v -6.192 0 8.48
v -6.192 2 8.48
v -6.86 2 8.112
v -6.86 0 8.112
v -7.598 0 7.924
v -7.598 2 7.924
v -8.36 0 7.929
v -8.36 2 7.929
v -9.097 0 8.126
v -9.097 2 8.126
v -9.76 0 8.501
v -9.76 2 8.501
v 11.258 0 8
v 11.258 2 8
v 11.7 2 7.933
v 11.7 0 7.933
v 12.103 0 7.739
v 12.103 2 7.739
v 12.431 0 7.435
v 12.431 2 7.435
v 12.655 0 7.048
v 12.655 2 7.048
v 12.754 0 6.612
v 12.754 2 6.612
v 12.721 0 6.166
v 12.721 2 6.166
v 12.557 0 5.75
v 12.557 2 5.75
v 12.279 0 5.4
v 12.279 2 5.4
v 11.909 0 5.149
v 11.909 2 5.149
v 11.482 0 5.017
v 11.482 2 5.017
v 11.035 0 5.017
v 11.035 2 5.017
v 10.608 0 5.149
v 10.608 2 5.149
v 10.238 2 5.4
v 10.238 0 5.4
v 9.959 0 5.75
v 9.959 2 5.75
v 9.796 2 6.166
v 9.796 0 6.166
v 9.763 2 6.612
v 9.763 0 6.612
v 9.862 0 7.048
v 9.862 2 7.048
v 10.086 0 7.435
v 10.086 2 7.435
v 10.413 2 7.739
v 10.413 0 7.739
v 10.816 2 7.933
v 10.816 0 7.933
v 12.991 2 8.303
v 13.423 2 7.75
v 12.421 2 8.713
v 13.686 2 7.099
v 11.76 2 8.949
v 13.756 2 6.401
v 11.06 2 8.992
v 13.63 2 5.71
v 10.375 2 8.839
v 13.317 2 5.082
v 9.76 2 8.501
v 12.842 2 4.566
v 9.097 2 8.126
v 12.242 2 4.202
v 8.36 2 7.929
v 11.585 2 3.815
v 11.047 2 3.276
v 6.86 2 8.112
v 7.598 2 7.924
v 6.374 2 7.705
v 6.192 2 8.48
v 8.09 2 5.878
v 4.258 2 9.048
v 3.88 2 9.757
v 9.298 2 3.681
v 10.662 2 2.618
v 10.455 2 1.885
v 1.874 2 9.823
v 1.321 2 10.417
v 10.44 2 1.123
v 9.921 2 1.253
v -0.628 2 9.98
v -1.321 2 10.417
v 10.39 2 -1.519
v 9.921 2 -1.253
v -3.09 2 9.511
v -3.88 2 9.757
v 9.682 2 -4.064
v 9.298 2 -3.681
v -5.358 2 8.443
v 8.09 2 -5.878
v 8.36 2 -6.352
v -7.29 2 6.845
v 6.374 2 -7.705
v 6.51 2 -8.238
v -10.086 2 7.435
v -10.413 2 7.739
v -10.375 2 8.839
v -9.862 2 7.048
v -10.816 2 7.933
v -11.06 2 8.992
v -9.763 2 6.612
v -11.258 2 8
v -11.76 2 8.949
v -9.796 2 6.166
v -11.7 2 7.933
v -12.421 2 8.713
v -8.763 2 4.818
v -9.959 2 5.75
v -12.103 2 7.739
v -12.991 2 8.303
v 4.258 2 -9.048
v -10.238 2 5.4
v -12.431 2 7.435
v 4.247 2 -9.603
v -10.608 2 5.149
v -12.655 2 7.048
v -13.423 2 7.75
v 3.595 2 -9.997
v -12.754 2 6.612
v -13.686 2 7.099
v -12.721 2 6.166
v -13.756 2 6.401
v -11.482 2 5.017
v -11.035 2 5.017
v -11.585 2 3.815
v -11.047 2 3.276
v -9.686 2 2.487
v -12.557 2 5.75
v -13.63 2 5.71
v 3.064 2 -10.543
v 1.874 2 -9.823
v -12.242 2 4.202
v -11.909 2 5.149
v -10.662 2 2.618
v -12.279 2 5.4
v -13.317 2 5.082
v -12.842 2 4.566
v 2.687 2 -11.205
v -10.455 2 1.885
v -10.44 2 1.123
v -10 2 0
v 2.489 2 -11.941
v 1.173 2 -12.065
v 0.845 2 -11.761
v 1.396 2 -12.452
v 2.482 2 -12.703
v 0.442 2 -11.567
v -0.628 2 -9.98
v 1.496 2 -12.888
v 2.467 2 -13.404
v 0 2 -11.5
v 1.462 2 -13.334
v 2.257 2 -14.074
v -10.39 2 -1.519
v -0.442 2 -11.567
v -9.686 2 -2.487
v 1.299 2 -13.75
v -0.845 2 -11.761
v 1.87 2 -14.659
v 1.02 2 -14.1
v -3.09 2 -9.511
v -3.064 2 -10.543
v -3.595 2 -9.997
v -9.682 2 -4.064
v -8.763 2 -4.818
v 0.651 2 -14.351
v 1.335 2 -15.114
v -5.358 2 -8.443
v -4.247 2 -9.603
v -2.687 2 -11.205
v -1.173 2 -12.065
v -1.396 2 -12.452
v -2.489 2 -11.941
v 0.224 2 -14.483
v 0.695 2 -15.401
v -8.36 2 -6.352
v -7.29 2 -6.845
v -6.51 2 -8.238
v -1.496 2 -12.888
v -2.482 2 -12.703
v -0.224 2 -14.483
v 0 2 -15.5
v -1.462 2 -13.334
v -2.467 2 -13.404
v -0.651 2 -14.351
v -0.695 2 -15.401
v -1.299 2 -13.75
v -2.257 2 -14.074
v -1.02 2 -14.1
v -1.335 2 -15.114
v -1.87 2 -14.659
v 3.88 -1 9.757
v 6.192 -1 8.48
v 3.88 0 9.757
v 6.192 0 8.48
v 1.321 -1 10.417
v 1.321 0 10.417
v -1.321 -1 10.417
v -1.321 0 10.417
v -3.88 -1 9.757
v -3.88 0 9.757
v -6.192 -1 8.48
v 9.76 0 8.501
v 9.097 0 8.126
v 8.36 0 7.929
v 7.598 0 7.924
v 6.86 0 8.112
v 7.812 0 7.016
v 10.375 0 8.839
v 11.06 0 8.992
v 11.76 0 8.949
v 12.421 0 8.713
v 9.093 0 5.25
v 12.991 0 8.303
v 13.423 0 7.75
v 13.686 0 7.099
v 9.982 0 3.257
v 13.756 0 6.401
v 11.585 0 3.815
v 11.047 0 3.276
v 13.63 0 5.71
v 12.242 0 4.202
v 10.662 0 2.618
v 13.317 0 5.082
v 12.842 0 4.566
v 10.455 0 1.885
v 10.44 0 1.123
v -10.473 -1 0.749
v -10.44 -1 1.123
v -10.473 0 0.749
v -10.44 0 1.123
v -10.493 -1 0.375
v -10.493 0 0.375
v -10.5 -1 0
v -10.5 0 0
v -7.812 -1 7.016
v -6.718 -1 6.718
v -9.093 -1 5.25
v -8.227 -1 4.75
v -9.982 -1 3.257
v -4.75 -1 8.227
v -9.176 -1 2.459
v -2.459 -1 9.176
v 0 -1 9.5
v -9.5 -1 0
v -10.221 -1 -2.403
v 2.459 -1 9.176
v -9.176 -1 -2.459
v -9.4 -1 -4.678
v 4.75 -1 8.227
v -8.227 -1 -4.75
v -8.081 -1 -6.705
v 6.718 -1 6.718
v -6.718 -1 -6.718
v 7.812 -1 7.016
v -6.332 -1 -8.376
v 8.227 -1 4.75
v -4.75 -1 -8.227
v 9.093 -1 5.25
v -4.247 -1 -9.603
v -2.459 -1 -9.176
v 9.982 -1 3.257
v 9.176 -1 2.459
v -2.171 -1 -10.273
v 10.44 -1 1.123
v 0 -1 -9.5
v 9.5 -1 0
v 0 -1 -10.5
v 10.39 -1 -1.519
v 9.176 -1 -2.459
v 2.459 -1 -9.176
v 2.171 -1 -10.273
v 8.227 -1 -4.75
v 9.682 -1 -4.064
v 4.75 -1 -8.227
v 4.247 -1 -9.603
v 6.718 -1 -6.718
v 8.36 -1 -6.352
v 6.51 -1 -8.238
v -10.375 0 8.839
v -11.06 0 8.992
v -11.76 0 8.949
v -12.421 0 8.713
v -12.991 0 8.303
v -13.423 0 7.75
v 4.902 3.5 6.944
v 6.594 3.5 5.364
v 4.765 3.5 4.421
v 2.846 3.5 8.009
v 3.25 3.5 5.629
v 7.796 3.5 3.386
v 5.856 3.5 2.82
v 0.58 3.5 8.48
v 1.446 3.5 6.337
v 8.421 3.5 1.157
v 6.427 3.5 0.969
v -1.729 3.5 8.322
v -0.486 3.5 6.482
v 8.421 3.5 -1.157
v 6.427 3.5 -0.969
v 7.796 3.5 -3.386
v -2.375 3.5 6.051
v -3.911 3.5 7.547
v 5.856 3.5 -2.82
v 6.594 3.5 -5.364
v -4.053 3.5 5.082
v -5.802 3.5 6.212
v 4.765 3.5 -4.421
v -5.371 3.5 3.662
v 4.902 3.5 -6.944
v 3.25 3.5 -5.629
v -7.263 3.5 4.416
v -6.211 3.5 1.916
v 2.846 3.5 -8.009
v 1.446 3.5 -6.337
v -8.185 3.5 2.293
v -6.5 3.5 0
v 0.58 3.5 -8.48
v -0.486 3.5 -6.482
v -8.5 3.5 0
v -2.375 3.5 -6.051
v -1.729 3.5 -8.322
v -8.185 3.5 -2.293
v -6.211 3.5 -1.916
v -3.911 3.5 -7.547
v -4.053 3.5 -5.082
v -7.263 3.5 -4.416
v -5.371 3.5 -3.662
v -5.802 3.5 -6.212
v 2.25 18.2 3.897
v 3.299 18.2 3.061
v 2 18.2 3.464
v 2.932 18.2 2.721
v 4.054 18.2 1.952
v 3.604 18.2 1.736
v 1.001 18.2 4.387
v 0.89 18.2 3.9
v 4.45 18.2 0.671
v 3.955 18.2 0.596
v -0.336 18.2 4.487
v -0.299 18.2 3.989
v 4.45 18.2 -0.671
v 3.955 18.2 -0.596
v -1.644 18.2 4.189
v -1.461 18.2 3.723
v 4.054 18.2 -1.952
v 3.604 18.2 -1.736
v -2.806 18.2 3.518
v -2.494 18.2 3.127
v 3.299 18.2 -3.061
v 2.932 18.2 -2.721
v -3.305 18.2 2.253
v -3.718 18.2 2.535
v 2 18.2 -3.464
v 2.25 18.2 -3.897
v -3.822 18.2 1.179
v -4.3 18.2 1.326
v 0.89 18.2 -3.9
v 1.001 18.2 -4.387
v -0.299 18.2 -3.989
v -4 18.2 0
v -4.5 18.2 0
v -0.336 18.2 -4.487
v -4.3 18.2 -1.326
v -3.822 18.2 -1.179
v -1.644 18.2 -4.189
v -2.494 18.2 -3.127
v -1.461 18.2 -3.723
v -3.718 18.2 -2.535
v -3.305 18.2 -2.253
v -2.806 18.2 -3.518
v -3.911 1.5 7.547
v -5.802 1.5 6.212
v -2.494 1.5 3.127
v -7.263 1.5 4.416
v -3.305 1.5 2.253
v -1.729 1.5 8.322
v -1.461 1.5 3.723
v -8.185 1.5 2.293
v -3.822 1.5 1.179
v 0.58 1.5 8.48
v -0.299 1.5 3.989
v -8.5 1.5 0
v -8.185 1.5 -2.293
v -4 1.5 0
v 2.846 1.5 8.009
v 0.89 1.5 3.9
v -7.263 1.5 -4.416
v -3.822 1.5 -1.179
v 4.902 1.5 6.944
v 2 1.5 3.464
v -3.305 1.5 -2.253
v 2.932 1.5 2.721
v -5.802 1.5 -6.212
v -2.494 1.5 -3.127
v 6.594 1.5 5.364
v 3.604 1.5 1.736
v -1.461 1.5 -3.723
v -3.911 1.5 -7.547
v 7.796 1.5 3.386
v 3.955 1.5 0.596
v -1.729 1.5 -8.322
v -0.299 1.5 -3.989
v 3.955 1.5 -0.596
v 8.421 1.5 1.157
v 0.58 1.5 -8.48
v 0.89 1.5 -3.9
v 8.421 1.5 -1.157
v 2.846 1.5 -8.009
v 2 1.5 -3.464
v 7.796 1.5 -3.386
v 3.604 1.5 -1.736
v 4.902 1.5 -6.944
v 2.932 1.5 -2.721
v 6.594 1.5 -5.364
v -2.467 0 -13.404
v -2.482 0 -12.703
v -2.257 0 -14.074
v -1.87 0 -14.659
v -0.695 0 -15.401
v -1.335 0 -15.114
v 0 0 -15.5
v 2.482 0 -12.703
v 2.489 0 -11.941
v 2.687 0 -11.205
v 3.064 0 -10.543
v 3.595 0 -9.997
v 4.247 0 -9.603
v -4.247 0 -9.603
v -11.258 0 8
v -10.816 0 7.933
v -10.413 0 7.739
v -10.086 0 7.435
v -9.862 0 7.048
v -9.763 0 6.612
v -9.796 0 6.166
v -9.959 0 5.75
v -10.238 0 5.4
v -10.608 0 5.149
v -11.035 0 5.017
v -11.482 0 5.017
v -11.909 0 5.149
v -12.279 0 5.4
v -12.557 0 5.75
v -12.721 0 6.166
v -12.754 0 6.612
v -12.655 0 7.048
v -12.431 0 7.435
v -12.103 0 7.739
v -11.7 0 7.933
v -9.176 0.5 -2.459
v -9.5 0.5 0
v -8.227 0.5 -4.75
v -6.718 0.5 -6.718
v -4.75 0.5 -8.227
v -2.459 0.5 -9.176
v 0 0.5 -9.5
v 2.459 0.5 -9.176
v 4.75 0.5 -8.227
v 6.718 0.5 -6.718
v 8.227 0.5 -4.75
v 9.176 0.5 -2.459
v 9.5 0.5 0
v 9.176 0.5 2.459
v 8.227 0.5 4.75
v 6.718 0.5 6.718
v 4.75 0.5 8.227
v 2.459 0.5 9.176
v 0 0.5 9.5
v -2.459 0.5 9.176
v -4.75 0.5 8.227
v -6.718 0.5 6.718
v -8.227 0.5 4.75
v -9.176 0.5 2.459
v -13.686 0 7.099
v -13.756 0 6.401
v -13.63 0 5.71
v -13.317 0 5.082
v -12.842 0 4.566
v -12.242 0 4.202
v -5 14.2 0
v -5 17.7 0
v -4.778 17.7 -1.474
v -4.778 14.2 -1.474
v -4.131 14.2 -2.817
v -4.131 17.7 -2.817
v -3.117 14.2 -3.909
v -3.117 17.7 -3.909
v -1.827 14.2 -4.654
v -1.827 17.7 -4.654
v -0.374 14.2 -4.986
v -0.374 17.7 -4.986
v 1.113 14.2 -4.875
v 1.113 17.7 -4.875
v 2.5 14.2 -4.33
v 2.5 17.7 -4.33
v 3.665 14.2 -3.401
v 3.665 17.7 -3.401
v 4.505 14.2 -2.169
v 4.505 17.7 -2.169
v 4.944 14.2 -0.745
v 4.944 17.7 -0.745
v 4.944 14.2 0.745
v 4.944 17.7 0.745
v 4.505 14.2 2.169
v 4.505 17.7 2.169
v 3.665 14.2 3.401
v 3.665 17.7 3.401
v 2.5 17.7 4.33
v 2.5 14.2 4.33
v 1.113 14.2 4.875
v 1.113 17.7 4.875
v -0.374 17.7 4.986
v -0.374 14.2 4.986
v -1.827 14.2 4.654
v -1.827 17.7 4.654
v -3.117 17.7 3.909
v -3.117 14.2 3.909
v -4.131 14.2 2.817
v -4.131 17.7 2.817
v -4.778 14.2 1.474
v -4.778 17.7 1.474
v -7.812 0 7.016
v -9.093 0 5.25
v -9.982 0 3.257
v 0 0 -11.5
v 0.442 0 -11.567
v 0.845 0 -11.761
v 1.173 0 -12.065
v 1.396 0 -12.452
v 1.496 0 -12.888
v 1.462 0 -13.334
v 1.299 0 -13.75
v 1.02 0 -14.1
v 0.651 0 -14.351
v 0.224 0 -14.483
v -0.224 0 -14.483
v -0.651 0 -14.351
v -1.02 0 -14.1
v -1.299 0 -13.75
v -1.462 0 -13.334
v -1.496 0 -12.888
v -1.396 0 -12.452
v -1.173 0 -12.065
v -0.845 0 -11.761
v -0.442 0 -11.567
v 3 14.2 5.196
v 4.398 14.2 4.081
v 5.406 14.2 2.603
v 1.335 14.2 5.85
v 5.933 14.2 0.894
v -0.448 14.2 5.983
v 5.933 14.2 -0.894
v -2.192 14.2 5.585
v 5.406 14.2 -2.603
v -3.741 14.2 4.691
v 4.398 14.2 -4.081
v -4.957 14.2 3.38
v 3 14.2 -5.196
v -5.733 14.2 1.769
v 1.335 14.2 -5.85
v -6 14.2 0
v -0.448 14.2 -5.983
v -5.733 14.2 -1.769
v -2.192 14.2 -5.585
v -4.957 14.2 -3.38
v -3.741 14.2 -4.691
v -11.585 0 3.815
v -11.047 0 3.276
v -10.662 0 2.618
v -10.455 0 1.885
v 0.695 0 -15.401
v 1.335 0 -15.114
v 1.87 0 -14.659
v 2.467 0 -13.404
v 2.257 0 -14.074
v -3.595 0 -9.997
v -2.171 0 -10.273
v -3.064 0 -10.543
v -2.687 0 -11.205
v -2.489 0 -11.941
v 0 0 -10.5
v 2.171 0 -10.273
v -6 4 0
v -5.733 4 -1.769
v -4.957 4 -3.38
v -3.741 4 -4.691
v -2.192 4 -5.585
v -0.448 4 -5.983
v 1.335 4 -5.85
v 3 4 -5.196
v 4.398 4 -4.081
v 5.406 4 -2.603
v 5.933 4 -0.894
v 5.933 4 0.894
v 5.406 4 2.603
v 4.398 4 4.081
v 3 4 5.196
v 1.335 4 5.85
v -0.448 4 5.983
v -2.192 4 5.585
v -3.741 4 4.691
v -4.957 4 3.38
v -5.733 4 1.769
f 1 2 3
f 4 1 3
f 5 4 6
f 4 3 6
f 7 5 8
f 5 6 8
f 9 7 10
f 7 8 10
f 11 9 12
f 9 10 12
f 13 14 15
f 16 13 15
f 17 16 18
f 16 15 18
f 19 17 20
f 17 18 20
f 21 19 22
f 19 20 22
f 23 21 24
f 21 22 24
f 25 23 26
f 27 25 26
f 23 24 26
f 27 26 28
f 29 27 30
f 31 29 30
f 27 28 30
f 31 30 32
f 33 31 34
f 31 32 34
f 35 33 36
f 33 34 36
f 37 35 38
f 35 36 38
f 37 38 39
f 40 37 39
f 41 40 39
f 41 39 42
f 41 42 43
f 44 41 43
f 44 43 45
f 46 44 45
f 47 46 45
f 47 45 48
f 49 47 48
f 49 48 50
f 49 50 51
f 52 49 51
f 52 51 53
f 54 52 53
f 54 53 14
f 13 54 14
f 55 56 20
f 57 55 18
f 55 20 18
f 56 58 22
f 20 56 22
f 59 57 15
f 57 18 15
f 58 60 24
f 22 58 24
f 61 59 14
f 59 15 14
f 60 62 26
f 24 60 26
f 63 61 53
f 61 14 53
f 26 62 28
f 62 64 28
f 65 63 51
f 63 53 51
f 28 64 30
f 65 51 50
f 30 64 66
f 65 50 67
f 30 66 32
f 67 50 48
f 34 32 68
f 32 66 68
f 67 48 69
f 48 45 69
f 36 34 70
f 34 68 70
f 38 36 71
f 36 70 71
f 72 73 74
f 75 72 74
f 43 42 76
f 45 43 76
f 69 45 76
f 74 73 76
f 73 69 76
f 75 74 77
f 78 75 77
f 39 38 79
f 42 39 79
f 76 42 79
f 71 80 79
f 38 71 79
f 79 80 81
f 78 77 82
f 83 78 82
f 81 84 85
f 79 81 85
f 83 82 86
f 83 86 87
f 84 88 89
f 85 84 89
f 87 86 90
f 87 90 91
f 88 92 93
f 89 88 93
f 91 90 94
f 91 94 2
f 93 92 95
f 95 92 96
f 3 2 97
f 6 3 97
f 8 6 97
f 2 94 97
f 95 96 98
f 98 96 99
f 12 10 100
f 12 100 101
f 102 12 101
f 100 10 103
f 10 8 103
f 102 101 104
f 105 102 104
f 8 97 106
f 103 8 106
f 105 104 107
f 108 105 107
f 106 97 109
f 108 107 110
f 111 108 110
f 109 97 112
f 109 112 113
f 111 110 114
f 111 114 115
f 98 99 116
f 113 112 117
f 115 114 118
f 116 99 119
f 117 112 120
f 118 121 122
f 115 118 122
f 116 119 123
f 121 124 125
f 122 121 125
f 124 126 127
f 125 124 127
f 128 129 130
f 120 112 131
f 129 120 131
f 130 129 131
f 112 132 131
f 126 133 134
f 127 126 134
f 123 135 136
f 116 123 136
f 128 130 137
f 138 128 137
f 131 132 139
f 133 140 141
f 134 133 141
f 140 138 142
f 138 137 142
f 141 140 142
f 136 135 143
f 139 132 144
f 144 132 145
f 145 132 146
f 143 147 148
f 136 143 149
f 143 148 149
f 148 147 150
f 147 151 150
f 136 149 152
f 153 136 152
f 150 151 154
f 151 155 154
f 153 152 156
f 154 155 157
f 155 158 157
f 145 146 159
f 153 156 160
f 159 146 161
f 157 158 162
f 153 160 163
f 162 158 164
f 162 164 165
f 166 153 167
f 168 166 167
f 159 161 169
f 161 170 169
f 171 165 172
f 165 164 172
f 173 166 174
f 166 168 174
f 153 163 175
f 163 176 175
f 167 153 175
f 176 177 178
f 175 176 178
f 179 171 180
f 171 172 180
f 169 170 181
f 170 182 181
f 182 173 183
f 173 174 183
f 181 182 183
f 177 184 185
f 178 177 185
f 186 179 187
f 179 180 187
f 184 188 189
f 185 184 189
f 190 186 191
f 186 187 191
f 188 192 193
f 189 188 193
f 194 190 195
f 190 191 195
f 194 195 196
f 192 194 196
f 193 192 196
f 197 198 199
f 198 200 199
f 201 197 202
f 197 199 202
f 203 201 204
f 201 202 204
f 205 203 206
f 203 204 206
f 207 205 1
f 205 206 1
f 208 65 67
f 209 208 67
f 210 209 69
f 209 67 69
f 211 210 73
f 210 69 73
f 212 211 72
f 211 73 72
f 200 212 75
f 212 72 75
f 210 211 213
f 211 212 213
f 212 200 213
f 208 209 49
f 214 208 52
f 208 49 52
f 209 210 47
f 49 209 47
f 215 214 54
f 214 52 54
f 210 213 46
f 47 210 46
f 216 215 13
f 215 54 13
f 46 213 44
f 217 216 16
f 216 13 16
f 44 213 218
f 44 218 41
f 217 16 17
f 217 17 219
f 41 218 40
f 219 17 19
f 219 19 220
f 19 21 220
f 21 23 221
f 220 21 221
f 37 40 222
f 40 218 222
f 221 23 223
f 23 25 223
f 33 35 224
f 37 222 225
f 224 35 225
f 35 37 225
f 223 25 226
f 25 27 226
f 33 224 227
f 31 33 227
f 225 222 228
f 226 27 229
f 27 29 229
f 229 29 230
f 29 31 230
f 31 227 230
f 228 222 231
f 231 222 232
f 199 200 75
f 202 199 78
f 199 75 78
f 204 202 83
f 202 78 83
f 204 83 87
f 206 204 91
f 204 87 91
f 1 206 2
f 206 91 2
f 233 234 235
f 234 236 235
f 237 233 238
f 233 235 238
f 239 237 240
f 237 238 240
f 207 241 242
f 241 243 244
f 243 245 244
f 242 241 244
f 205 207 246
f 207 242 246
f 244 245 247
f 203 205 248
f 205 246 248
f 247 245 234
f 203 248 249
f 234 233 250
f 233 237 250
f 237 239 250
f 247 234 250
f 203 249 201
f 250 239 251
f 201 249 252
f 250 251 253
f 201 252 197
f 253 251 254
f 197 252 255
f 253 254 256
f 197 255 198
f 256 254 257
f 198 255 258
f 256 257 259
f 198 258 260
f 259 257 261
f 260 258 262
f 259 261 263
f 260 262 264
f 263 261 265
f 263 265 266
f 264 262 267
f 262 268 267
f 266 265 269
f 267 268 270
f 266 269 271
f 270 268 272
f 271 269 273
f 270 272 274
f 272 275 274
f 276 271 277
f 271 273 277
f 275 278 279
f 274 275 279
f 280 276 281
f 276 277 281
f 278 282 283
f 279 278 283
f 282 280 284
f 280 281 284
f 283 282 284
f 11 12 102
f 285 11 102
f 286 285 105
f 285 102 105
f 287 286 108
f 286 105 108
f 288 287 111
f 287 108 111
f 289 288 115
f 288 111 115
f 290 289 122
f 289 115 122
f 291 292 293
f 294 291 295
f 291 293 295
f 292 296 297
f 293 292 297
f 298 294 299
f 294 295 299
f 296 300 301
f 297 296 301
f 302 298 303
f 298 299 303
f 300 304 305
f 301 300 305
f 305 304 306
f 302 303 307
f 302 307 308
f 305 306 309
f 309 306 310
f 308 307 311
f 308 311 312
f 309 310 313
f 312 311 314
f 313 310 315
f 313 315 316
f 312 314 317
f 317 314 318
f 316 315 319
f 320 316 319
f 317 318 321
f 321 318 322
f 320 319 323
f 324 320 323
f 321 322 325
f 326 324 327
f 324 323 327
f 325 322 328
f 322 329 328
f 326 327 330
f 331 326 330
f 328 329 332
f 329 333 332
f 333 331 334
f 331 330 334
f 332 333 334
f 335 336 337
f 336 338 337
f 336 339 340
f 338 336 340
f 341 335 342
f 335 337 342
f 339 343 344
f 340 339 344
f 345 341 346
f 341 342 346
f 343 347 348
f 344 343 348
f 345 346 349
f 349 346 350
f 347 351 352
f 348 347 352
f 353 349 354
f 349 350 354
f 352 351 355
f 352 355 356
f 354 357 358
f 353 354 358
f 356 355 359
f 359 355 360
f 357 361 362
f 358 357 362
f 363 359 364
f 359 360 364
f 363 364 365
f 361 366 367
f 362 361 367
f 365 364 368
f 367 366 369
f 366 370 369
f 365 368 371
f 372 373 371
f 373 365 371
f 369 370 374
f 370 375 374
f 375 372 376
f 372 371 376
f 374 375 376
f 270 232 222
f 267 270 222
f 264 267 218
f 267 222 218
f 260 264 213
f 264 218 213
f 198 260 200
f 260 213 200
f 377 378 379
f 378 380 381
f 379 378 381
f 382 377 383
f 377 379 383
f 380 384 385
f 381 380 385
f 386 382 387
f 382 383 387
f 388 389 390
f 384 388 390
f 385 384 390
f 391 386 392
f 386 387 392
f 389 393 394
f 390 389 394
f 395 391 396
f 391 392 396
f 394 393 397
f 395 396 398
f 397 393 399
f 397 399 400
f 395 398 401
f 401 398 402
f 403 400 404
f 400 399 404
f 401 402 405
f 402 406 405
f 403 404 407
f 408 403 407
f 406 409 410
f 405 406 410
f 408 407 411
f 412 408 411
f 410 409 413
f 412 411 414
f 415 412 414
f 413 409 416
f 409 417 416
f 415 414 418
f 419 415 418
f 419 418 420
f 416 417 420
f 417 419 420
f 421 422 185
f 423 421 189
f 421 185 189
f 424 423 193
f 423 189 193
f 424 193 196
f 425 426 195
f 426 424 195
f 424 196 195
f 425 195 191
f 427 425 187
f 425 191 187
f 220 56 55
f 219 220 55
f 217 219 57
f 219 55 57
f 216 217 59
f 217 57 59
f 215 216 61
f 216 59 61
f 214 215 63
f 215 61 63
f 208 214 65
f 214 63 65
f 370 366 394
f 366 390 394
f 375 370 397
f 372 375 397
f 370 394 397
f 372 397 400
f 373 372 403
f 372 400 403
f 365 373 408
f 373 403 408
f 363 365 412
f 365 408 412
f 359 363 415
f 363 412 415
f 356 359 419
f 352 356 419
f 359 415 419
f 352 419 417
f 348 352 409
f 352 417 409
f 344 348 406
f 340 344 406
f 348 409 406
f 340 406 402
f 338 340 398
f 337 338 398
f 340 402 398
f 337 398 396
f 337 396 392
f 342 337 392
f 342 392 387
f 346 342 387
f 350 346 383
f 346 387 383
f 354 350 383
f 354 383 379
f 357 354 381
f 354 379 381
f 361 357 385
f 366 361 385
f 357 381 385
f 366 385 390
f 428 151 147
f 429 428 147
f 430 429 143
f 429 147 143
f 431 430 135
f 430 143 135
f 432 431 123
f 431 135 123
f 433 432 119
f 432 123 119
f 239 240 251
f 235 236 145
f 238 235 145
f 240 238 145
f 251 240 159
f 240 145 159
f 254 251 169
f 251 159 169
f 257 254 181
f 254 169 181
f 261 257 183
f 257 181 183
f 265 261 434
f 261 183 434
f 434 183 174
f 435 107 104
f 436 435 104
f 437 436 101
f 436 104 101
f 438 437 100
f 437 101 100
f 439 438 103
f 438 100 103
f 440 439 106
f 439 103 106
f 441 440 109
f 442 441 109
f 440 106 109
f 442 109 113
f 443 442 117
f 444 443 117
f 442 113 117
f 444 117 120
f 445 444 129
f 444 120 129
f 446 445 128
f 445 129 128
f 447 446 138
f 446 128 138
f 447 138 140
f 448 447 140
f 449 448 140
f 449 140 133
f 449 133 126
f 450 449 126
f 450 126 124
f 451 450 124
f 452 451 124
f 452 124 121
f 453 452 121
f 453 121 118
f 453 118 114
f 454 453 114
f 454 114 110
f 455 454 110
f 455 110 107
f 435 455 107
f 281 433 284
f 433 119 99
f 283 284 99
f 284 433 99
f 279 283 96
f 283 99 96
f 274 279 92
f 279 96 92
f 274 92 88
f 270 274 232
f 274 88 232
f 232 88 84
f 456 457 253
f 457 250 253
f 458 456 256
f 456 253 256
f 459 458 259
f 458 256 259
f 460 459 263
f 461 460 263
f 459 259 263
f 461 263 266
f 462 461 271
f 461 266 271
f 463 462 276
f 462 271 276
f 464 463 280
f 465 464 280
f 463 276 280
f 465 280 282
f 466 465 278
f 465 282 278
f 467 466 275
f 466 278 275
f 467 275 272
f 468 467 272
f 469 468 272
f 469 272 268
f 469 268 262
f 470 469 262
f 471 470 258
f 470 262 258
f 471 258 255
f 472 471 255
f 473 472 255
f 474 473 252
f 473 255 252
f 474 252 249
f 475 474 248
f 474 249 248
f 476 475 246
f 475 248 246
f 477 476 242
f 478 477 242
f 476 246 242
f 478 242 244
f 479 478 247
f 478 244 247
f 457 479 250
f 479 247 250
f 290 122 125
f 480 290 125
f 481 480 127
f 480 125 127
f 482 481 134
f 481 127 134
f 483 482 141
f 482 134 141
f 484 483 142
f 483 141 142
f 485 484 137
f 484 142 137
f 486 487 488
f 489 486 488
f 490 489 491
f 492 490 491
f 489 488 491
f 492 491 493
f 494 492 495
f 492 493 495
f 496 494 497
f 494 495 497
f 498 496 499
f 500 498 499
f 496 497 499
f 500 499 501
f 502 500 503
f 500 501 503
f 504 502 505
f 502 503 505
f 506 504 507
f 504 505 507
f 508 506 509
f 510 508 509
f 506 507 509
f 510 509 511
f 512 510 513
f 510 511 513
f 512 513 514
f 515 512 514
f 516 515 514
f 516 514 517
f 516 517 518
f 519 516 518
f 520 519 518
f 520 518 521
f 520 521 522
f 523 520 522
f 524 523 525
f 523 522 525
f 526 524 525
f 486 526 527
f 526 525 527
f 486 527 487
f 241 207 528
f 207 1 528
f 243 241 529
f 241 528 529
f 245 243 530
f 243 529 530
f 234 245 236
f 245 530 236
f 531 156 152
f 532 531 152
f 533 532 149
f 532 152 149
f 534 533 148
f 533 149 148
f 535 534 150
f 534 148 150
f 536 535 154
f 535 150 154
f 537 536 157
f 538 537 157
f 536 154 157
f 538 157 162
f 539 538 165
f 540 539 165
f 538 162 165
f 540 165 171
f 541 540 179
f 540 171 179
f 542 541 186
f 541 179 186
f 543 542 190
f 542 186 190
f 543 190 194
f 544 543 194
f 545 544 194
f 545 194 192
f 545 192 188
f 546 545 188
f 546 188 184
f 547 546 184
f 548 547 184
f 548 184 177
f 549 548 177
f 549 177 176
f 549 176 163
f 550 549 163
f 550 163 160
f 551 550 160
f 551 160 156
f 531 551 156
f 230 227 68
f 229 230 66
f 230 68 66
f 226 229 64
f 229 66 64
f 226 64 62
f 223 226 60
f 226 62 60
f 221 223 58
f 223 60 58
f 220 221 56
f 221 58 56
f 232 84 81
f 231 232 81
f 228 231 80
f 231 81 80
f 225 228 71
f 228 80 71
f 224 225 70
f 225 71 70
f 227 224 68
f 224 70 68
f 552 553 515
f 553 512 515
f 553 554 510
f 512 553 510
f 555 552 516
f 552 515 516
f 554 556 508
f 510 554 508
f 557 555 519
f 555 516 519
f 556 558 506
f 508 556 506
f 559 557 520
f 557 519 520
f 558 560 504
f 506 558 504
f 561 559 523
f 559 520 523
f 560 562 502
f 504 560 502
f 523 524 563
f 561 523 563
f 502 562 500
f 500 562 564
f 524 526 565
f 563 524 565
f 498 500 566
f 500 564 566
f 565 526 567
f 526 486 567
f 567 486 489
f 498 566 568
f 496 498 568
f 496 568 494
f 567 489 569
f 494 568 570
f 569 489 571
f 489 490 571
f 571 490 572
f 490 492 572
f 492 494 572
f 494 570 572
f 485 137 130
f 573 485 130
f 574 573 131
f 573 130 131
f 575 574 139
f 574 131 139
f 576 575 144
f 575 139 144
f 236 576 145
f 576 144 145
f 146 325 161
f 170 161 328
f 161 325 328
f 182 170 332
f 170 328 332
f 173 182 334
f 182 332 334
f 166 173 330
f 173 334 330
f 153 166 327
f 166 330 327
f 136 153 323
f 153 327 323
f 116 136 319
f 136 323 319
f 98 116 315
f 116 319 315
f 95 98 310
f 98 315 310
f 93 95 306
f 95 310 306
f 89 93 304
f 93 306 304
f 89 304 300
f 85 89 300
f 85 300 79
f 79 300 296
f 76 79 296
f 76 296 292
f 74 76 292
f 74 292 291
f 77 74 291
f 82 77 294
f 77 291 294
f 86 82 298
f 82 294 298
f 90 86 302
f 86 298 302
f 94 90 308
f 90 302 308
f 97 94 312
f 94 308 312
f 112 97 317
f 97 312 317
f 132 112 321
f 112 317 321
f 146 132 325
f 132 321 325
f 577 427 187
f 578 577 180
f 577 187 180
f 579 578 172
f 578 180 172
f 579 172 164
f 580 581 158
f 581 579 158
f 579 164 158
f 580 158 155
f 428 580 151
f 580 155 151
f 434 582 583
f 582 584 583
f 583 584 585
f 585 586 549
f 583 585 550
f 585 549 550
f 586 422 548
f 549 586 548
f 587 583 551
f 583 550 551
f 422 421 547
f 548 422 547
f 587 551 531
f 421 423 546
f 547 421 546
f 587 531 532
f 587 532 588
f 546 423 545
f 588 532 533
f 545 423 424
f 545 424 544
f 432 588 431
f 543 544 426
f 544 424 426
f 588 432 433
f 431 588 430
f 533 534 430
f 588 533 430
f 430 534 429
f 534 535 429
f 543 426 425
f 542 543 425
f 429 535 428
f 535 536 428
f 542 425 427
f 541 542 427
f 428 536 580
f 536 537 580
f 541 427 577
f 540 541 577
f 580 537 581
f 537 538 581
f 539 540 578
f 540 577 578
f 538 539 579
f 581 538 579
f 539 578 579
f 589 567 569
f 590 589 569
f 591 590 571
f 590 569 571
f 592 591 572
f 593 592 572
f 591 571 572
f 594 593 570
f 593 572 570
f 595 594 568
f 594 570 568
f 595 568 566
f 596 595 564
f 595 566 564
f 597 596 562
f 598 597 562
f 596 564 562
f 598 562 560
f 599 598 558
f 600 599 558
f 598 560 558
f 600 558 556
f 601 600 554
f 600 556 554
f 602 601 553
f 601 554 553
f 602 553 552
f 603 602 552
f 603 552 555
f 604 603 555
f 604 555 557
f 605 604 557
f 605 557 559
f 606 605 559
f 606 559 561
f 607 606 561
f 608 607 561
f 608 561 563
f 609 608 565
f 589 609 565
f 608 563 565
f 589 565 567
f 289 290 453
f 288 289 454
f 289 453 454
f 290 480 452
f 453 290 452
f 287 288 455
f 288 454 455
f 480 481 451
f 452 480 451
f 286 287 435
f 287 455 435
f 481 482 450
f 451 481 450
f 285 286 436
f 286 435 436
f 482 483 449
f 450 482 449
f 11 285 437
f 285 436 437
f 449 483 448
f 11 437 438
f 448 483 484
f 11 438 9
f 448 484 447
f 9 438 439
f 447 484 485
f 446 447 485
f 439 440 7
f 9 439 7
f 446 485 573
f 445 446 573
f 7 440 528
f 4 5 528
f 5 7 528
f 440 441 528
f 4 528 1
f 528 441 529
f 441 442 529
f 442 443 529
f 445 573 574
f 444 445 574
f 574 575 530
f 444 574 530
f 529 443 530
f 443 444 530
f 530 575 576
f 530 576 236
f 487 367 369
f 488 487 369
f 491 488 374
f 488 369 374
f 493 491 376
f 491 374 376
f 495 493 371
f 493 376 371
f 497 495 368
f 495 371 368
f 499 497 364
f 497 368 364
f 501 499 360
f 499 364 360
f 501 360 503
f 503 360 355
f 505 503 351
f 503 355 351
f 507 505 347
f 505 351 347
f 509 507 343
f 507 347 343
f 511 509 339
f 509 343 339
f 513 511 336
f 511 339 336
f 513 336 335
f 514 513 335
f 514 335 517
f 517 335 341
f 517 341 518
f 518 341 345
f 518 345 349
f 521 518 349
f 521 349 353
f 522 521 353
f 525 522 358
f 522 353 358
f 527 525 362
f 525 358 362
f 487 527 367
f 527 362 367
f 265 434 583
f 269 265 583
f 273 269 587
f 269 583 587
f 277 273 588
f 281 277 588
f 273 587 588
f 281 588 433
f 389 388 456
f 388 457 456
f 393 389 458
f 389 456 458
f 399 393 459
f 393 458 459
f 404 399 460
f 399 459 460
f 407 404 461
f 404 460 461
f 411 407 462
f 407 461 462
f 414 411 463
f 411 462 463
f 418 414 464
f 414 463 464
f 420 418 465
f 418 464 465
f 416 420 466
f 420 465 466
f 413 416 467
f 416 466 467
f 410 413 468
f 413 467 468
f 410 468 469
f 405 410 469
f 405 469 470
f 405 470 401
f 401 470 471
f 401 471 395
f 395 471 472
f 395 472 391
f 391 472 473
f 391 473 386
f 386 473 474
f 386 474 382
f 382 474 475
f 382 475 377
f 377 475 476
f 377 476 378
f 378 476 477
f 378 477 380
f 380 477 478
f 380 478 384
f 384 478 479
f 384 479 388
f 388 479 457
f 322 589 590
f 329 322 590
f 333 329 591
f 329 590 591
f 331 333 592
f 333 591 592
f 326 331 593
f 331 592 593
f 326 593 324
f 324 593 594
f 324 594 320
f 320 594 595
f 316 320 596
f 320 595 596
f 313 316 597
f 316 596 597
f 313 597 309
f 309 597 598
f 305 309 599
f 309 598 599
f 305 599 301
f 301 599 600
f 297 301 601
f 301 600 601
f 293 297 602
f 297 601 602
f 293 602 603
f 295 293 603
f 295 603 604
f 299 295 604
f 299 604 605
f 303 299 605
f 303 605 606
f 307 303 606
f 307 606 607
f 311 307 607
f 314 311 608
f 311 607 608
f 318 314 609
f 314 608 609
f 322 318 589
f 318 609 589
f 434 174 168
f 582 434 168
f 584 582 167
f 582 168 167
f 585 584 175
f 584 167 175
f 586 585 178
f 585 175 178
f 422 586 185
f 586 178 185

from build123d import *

# Parameters (mm, degrees)
CHAMFER_1_SIZE      = 0.5
SKETCH_2_R          = 1.5
CUT_EXTRUDE_1_DEPTH = 28.256925725


with BuildPart() as part:
    # 草图1 → 旋转1 (revolve)
    with BuildSketch(Plane.XY, mode=Mode.PRIVATE) as revolve_1_sk:
        Polygon((10.5, 0), (15.5, 0), (15.5, 2), (10, 2), (8.5, 3.5), (6, 3.5), (6, 14.2), (5, 14.2), (5, 18.2), (4, 18.2), (4, 1.5), (8.5, 1.5), (9.5, 0.5), (9.5, -1), (10.5, -1), align=None)
    revolve(revolve_1_sk.sketch.rotate(Axis((0, 18.9, 0), (0, -1, 0)), 180), axis=Axis((0, 18.9, 0), (0, -1, 0)))

    # 倒角1
    chamfer_1_edges = [part.edges().sort_by_distance(p)[0] for p in [
        (5, 18.2, 0),
        (6, 3.5, 0),
    ]]
    chamfer(chamfer_1_edges, length=CHAMFER_1_SIZE)

    # 草图2 → 切除-拉伸1 (cut, through all)
    with BuildSketch(Plane(origin=(0, 2, 0), x_dir=(1, 0, 0), z_dir=(0, 1, 0))):
        with Locations(Location((0, 13, 0), (0, 0, 270))):
            Circle(SKETCH_2_R)
        with Locations(Location((11.258330249, -6.5, 0), (0, 0, 270))):
            Circle(SKETCH_2_R)
        with Locations(Location((-11.258330249, -6.5, 0), (0, 0, 270))):
            Circle(SKETCH_2_R)
        with BuildLine():
            ThreePointArc((13.423393657, -7.750000175), (13.423393809, 7.749999912), (0, 15.5))
            ThreePointArc((0, 15.5), (1.86989398, 14.659366296), (2.482271238, 12.702797203))
            ThreePointArc((2.482271238, 12.702797203), (2.853955321, 10.861790304), (4.247441896, 9.602564103))
            ThreePointArc((4.247441896, 9.602564103), (9.09326674, 5.25), (10.439785402, -1.122889469))
            ThreePointArc((10.439785402, -1.122889469), (10.833563994, -2.959297343), (12.242080696, -4.20168865))
            ThreePointArc((12.242080696, -4.20168865), (13.630330638, -5.710307555), (13.423393657, -7.750000175))
        make_face()
        with BuildLine():
            ThreePointArc((-2.482271238, 12.702797203), (-1.86989398, 14.659366296), (0, 15.5))
            ThreePointArc((0, 15.5), (-13.42339379, 7.749999945), (-13.423393696, -7.750000109))
            ThreePointArc((-13.423393696, -7.750000109), (-13.630330625, -5.710307519), (-12.242080696, -4.20168865))
            ThreePointArc((-12.242080696, -4.20168865), (-10.833563994, -2.959297343), (-10.439785402, -1.122889469))
            ThreePointArc((-10.439785402, -1.122889469), (-9.09326674, 5.25), (-4.247441896, 9.602564103))
            ThreePointArc((-4.247441896, 9.602564103), (-2.853955321, 10.861790304), (-2.482271238, 12.702797203))
        make_face()
        with BuildLine():
            ThreePointArc((-13.423393696, -7.750000109), (-3.8e-08, -15.5), (13.423393657, -7.750000175))
            ThreePointArc((13.423393657, -7.750000175), (11.760436526, -8.949058857), (9.759809458, -8.501108552))
            ThreePointArc((9.759809458, -8.501108552), (7.979608673, -7.902492961), (6.192343507, -8.479674634))
            ThreePointArc((6.192343507, -8.479674634), (0, -10.5), (-6.192343507, -8.479674634))
            ThreePointArc((-6.192343507, -8.479674634), (-7.979608673, -7.902492961), (-9.759809458, -8.501108552))
            ThreePointArc((-9.759809458, -8.501108552), (-11.760436564, -8.94905885), (-13.423393696, -7.750000109))
        make_face()
    extrude(amount=-CUT_EXTRUDE_1_DEPTH, mode=Mode.SUBTRACT)


solid = part.part
